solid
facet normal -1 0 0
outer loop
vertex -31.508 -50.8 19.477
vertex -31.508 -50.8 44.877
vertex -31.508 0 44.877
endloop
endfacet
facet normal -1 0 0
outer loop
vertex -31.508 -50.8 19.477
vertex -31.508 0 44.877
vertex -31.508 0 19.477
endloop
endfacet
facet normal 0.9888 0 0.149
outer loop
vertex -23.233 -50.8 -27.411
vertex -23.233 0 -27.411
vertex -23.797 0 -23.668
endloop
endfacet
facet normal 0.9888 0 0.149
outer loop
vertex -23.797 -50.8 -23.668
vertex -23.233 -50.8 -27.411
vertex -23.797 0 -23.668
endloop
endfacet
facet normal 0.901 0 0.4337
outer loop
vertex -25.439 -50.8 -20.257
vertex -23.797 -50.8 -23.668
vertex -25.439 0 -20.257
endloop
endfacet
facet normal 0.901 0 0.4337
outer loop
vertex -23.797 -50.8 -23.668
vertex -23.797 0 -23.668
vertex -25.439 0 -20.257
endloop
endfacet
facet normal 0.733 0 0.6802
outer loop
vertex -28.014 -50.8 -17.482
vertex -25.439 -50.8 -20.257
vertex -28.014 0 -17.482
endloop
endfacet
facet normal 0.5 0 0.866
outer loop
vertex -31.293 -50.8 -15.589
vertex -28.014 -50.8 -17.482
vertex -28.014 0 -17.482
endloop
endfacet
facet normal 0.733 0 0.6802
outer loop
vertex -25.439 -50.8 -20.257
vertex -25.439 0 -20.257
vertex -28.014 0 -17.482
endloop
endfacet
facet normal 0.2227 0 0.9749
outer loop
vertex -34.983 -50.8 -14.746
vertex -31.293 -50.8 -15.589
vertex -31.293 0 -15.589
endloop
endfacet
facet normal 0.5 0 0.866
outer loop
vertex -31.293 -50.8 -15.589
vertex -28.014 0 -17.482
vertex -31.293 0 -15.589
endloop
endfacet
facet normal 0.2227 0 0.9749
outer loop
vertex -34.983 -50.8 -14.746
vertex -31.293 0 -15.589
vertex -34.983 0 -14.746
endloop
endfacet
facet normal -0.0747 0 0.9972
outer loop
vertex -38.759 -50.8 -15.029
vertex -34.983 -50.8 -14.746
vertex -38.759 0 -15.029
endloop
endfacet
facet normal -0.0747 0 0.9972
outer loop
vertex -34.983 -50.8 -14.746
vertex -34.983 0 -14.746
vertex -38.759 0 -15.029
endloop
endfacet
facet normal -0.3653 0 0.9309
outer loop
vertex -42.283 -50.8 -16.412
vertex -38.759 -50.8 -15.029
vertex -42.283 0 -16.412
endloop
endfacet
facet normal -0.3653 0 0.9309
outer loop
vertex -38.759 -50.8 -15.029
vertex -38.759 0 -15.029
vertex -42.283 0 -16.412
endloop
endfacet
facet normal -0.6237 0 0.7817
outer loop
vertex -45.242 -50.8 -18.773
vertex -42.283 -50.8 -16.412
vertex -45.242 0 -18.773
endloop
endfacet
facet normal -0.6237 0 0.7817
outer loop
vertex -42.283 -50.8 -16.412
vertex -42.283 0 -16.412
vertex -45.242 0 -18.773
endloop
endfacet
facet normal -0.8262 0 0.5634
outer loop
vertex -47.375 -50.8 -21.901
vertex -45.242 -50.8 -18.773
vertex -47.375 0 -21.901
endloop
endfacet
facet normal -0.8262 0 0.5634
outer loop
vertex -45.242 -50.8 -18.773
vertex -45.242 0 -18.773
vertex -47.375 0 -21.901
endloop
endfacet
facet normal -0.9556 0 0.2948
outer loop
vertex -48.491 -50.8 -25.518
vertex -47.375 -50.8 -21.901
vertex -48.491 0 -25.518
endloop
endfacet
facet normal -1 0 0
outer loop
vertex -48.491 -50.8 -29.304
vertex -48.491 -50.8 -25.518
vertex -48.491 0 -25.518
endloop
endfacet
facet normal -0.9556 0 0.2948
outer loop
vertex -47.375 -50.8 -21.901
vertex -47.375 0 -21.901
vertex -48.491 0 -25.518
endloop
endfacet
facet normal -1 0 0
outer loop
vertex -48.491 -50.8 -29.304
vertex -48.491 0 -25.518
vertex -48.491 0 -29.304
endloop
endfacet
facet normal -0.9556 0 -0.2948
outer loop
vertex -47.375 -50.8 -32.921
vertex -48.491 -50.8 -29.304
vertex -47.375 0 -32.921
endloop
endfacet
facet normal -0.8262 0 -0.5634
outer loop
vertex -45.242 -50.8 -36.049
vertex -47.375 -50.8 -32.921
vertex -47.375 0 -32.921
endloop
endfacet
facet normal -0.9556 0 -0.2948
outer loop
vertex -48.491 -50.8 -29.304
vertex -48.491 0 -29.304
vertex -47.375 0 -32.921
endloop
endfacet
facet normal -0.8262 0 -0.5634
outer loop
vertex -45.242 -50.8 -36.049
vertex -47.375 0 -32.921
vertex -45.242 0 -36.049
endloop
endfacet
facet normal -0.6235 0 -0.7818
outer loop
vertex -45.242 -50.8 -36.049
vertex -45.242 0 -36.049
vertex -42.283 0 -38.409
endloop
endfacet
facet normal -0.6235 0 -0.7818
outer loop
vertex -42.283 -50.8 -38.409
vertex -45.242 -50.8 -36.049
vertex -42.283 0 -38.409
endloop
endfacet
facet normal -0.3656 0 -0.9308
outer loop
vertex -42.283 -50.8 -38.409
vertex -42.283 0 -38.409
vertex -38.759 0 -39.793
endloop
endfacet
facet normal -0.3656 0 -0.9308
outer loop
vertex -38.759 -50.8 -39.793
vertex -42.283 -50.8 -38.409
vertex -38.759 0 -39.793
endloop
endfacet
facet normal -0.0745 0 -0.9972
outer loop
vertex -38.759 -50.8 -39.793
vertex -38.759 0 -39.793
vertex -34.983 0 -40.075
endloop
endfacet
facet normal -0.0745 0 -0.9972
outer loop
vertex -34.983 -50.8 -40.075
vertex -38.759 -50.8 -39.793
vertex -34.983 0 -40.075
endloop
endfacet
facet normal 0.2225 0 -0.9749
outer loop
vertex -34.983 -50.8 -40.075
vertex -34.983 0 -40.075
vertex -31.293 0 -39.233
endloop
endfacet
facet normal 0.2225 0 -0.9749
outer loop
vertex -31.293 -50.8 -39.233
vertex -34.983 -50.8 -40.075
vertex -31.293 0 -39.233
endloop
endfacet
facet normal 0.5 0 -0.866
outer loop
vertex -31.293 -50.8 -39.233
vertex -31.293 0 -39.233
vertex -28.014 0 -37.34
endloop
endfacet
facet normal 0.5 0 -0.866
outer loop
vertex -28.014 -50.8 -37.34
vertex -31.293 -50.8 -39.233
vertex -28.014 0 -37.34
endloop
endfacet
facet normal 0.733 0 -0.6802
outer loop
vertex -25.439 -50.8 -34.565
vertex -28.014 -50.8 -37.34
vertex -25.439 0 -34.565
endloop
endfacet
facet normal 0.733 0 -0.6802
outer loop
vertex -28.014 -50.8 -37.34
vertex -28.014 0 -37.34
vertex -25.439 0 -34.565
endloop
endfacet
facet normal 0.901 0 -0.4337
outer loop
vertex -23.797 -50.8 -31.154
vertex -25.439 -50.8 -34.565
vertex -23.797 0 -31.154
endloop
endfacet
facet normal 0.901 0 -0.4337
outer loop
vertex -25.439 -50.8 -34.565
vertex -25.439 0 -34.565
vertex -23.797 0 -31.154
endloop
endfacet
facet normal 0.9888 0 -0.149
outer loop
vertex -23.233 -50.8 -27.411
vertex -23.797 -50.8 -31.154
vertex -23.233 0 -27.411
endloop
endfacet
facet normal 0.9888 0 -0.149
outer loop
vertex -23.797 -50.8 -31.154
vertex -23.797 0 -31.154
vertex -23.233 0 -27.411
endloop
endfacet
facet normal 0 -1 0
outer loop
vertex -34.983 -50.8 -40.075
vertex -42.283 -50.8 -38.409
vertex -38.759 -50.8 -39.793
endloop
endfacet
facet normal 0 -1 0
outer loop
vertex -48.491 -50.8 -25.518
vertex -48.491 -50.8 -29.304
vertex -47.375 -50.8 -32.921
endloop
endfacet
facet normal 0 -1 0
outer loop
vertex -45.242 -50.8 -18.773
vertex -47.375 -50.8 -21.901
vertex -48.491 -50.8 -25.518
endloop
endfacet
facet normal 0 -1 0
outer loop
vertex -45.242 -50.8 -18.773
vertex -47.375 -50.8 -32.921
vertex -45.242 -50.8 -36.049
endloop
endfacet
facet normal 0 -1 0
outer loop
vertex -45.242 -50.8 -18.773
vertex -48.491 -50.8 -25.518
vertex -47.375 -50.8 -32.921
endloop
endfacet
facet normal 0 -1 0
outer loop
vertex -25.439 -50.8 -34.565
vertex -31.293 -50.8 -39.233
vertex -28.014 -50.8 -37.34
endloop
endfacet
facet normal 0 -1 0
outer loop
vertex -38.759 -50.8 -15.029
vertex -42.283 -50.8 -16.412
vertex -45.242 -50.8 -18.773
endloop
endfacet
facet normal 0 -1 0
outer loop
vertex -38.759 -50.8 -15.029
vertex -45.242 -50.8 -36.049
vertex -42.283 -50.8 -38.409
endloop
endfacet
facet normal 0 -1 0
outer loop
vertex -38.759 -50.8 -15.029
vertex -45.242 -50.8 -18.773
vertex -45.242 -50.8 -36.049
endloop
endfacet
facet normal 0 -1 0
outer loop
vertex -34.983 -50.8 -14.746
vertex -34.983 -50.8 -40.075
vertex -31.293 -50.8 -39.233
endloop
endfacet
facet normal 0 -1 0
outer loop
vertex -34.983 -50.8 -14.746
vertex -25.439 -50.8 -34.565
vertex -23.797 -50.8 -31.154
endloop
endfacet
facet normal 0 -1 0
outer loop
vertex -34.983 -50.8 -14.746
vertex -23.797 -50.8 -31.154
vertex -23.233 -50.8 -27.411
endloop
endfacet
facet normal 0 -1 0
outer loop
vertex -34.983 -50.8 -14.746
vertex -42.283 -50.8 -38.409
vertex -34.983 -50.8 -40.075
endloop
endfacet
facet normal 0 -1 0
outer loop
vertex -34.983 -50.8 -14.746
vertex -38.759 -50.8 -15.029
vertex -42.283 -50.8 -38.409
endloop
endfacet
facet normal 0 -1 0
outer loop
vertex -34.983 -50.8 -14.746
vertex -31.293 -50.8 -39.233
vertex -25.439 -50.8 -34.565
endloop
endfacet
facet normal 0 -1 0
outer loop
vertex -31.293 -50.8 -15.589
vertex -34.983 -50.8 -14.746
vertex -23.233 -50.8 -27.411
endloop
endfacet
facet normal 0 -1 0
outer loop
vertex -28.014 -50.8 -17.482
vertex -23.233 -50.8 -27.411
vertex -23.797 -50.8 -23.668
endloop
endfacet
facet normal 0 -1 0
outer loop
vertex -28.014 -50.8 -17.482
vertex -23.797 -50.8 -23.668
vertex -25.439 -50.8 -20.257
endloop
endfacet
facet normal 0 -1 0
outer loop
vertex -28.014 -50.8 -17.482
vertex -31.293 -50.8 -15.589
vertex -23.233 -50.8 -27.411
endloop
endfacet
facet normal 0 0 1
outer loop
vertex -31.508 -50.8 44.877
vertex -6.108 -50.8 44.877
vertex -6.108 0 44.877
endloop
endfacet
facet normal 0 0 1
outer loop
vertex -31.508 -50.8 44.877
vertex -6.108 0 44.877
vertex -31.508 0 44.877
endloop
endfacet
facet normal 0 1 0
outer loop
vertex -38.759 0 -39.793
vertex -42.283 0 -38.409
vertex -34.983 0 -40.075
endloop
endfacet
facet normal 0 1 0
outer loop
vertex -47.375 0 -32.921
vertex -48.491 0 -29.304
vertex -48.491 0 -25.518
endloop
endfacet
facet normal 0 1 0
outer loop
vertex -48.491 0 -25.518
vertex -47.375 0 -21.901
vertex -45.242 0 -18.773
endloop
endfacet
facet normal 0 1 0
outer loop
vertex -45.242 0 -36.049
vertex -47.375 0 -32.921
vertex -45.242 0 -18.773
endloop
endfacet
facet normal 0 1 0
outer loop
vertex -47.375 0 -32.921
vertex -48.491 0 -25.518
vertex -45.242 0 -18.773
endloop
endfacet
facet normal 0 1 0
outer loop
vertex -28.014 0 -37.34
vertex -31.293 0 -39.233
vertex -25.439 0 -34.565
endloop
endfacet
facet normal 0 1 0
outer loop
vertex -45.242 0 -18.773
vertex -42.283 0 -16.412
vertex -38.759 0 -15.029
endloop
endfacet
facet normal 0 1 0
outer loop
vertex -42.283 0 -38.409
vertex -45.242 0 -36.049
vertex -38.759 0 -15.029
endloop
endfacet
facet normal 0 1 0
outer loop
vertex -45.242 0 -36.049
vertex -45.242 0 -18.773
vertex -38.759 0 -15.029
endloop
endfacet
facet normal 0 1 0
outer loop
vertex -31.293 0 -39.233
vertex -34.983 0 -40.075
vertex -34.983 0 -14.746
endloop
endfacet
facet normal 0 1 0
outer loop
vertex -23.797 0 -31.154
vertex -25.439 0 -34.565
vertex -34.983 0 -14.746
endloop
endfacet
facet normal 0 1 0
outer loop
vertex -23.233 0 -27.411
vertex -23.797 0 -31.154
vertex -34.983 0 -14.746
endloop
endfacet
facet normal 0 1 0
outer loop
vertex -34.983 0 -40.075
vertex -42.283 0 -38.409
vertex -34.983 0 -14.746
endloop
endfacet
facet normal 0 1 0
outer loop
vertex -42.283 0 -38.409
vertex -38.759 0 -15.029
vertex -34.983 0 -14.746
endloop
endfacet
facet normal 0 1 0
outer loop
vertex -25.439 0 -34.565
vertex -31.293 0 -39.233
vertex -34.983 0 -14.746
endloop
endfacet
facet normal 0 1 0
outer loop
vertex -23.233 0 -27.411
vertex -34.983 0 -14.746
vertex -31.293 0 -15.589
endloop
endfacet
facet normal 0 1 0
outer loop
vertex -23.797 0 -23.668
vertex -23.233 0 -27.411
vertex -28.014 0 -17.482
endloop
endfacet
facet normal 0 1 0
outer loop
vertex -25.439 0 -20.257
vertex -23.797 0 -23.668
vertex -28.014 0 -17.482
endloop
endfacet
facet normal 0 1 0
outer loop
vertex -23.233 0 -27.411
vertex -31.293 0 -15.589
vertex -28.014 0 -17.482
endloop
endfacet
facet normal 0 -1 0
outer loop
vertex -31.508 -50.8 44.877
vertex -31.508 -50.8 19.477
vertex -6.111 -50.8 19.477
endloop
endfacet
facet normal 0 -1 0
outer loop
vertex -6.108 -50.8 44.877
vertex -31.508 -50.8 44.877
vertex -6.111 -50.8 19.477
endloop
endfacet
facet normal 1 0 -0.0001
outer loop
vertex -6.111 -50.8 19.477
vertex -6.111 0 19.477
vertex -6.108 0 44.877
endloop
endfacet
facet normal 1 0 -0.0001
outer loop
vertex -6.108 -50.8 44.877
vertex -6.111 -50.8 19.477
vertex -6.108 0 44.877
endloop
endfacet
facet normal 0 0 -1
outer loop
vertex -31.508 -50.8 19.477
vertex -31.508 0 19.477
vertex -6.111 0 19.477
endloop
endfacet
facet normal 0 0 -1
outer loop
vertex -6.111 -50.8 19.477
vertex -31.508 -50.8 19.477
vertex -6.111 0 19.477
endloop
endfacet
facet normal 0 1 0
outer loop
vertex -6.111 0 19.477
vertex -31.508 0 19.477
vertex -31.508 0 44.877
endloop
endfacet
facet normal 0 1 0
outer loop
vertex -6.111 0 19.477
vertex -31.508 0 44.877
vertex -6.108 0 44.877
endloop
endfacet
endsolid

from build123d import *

# Parameters (mm, degrees)
F1_DEPTH = 50.8
F2_R     = 12.7
F3_DEPTH = 50.8


with BuildPart() as f1:
    # F0 (on Front) → F1 (new body)
    with BuildSketch(Plane.XZ):
        Polygon((-6.110549, 19.477375), (-6.107518, 44.877375), (-31.507518, 44.877375), (-31.507518, 19.477375), align=None)
    extrude(amount=F1_DEPTH)


with BuildPart() as f3:
    # F2 (on Front) → F3 (new body)
    with BuildSketch(Plane.XZ):
        with Locations((-35.932552, -27.410926)):
            Circle(F2_R)
    extrude(amount=F3_DEPTH)


solid = Compound([f1.part, f3.part])
